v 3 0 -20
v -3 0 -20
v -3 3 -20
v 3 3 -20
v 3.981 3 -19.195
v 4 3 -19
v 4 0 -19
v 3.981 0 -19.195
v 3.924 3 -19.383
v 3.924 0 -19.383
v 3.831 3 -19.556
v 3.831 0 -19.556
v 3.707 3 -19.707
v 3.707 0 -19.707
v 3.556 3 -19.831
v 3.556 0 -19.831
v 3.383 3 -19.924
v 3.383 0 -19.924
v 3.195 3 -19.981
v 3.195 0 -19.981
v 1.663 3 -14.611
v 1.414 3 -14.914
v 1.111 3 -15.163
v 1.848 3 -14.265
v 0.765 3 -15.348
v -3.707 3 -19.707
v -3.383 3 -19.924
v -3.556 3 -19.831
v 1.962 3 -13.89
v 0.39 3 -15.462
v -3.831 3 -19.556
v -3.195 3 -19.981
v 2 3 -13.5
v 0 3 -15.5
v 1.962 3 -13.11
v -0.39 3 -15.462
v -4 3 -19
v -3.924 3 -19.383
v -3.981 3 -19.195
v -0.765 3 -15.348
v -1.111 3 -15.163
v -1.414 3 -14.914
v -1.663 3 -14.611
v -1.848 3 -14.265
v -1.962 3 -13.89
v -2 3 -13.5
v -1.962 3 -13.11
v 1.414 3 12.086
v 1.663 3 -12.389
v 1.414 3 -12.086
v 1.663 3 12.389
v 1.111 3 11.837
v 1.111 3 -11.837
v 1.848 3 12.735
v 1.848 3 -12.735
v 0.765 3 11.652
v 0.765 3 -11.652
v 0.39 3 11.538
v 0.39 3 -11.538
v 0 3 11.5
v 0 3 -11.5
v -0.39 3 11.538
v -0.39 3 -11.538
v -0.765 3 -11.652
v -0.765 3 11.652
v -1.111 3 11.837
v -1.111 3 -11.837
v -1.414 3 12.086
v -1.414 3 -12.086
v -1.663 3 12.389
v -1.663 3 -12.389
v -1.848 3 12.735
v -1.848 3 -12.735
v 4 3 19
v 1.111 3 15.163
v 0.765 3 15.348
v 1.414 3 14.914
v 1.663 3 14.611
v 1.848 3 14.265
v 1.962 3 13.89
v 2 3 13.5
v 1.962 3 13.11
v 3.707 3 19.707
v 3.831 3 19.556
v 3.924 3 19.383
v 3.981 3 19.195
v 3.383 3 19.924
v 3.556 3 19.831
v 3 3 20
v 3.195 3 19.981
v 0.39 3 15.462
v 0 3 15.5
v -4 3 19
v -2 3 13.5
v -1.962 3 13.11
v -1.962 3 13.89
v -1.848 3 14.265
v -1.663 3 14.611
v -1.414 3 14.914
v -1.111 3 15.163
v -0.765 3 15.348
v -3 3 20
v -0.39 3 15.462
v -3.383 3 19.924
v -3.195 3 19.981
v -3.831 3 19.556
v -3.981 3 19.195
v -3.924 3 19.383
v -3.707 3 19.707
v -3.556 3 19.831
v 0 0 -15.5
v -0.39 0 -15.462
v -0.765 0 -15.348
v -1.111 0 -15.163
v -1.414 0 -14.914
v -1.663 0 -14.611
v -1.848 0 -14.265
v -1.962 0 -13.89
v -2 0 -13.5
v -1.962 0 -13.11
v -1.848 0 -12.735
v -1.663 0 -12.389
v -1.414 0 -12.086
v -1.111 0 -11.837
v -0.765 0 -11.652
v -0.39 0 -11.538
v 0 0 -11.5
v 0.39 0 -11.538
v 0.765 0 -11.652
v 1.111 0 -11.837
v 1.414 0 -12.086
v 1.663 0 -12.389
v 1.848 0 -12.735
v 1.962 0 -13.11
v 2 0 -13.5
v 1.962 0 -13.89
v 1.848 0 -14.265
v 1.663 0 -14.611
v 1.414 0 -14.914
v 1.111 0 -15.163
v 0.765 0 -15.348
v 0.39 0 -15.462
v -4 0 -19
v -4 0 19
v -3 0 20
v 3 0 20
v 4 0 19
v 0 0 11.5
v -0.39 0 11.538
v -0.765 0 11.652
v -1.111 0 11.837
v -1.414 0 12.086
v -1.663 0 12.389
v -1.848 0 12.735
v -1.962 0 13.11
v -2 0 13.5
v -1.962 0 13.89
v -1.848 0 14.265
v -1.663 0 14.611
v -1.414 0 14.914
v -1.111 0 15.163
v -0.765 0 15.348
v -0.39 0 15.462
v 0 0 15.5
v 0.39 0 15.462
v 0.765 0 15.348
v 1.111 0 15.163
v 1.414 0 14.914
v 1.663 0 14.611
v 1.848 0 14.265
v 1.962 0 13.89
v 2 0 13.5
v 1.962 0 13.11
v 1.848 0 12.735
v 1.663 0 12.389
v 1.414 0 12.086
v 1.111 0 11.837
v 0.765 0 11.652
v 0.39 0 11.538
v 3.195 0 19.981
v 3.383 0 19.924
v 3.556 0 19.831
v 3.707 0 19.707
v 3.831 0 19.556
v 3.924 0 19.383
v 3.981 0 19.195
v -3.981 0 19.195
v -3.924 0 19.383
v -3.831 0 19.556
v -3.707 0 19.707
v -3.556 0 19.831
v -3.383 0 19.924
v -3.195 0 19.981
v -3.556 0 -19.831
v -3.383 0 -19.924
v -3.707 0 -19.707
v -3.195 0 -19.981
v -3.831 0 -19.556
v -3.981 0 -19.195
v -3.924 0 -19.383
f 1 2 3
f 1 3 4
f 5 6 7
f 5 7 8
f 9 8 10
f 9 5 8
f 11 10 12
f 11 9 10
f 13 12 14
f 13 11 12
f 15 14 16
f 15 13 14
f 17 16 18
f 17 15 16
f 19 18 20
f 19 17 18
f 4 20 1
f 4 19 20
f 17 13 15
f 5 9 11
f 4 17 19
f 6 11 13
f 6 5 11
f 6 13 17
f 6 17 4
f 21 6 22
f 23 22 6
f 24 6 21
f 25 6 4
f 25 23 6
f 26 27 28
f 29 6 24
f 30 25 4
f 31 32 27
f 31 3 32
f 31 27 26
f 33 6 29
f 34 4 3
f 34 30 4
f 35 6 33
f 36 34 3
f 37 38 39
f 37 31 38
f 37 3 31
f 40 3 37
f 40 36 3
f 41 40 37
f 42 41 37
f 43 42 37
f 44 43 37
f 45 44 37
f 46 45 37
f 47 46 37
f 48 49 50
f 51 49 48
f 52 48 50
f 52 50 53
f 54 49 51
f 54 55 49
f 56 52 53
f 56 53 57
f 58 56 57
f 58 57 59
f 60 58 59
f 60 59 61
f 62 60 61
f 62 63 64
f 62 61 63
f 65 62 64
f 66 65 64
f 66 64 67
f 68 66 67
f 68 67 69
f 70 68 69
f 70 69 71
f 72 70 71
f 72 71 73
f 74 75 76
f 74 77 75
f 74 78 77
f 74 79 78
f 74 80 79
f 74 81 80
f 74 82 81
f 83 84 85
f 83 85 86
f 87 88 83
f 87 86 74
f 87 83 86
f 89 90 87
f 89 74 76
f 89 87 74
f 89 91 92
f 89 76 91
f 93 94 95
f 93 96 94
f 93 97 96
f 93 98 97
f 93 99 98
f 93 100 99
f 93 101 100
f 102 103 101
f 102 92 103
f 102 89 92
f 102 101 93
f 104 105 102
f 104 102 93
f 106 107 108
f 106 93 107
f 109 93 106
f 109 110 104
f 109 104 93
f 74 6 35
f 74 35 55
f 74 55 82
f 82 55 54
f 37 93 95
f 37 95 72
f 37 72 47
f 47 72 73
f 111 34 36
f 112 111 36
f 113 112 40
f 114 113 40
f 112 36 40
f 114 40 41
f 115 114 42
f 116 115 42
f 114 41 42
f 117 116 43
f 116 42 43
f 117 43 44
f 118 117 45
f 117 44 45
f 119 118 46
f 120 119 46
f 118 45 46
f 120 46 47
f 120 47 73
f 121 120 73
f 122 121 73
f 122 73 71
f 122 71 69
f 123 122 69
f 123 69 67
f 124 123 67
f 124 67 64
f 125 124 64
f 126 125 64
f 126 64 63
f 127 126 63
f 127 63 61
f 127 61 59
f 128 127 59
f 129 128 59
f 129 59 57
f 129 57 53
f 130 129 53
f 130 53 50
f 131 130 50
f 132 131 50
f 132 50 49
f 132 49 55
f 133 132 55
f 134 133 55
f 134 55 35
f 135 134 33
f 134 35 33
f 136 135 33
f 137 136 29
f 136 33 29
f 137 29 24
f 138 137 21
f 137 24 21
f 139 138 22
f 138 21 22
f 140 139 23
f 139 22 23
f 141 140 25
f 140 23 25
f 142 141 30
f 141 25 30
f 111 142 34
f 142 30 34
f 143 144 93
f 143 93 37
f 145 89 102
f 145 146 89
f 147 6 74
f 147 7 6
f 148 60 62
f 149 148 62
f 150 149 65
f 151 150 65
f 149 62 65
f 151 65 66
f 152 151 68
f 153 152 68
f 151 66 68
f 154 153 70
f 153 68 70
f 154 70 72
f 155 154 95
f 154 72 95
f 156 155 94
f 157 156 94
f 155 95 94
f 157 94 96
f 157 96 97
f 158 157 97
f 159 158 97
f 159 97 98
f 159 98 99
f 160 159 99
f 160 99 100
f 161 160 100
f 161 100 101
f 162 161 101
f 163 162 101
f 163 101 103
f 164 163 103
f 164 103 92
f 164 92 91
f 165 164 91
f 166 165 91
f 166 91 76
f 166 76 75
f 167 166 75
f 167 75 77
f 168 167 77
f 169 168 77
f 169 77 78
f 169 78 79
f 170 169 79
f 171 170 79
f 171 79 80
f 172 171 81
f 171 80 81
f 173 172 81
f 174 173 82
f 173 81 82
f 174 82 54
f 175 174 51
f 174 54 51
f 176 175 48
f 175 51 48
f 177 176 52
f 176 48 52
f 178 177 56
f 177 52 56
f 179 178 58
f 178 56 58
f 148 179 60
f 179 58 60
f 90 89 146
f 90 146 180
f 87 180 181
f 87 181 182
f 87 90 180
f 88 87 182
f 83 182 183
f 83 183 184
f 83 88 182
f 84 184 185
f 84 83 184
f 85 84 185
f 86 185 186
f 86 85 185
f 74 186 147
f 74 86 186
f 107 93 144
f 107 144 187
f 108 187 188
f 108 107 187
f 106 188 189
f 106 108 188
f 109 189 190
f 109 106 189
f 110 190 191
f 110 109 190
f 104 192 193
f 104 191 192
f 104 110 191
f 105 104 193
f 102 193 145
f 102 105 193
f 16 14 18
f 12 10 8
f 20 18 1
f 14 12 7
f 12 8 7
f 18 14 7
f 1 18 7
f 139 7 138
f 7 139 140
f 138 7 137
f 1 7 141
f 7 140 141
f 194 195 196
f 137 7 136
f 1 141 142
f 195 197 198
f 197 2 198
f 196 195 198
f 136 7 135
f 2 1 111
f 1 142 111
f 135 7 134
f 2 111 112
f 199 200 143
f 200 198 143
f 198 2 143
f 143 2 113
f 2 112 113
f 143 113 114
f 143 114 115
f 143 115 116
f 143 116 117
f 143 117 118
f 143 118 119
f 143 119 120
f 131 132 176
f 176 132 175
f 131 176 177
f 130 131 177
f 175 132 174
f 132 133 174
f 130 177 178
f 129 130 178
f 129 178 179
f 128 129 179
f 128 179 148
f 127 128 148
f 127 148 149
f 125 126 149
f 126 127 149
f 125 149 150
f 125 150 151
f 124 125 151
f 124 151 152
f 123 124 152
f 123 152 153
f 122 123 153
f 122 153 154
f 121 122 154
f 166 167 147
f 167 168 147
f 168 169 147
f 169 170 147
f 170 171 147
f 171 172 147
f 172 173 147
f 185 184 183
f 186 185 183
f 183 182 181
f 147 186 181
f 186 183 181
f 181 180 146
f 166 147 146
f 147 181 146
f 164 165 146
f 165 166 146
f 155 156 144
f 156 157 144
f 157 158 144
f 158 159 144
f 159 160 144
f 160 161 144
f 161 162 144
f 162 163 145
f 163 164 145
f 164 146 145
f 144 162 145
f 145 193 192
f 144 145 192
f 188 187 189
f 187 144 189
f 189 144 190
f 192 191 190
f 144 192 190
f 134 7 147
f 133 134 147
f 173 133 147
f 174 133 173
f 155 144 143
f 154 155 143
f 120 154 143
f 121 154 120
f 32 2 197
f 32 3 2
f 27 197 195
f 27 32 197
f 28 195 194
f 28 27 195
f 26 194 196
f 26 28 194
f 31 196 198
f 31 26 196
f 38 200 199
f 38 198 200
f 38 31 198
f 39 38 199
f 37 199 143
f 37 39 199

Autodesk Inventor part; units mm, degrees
ref_plane "YZ Plane" through (0, 0, 0) normal (1, 0, 0) x (0, 1, 0)
ref_plane "XZ Plane" through (0, 0, 0) normal (0, 1, 0) x (-1, 0, 0)
ref_plane "XY Plane" through (0, 0, 0) normal (0, 0, 1) x (1, 0, 0)
sketch "Sketch1" plane through (0, 0, 0) normal (0, 1, 0) x (-1, 0, 0)
  line L0 (-4, 20) -> (4, 20)
  line L1 (4, 20) -> (4, -20)
  line L2 (4, -20) -> (-4, -20)
  line L3 (-4, -20) -> (-4, 20)
  line L4 (-4, 20) -> (4, -20) construction
  line L5 (4, 20) -> (-4, -20) construction
  line L6 (0, -20) -> (0, -13.5) construction
  line L7 (0, 20) -> (0, 13.5) construction
  point P0 (0, 0)
  dimension "d0" = 40
  dimension "d1" = 6.5
  dimension "d2" = 8
extrude "Extrusion1" add sketch "Sketch1" along normal blind 3
hole "Hole1" at (0, 0, -13.5) at (0, 0, 13.5) direction (0, 1, 0) diameter 4 end through all
fillet "Fillet1" radius 1 4 edges at (4, 1.5, 20) (-4, 1.5, 20) (4, 1.5, -20) (-4, 1.5, -20)
equation "\"d0\" = gauge_length"
equation "\"d1\" = hole_2_border"
equation "\"d2\" = gauge_width"
equation "\"d3\" = gauge_thickness"
equation "\"d5\" = hole_diameter"
equation "\"gauge_length\" = 40"
equation "\"gauge_width\" = 8"
equation "\"gauge_thickness\" = 3"
equation "\"hole_diameter\" = 4"
equation "\"hole_2_border\" = 6.5"
properties part number "gauge" material "Stainless Steel"
